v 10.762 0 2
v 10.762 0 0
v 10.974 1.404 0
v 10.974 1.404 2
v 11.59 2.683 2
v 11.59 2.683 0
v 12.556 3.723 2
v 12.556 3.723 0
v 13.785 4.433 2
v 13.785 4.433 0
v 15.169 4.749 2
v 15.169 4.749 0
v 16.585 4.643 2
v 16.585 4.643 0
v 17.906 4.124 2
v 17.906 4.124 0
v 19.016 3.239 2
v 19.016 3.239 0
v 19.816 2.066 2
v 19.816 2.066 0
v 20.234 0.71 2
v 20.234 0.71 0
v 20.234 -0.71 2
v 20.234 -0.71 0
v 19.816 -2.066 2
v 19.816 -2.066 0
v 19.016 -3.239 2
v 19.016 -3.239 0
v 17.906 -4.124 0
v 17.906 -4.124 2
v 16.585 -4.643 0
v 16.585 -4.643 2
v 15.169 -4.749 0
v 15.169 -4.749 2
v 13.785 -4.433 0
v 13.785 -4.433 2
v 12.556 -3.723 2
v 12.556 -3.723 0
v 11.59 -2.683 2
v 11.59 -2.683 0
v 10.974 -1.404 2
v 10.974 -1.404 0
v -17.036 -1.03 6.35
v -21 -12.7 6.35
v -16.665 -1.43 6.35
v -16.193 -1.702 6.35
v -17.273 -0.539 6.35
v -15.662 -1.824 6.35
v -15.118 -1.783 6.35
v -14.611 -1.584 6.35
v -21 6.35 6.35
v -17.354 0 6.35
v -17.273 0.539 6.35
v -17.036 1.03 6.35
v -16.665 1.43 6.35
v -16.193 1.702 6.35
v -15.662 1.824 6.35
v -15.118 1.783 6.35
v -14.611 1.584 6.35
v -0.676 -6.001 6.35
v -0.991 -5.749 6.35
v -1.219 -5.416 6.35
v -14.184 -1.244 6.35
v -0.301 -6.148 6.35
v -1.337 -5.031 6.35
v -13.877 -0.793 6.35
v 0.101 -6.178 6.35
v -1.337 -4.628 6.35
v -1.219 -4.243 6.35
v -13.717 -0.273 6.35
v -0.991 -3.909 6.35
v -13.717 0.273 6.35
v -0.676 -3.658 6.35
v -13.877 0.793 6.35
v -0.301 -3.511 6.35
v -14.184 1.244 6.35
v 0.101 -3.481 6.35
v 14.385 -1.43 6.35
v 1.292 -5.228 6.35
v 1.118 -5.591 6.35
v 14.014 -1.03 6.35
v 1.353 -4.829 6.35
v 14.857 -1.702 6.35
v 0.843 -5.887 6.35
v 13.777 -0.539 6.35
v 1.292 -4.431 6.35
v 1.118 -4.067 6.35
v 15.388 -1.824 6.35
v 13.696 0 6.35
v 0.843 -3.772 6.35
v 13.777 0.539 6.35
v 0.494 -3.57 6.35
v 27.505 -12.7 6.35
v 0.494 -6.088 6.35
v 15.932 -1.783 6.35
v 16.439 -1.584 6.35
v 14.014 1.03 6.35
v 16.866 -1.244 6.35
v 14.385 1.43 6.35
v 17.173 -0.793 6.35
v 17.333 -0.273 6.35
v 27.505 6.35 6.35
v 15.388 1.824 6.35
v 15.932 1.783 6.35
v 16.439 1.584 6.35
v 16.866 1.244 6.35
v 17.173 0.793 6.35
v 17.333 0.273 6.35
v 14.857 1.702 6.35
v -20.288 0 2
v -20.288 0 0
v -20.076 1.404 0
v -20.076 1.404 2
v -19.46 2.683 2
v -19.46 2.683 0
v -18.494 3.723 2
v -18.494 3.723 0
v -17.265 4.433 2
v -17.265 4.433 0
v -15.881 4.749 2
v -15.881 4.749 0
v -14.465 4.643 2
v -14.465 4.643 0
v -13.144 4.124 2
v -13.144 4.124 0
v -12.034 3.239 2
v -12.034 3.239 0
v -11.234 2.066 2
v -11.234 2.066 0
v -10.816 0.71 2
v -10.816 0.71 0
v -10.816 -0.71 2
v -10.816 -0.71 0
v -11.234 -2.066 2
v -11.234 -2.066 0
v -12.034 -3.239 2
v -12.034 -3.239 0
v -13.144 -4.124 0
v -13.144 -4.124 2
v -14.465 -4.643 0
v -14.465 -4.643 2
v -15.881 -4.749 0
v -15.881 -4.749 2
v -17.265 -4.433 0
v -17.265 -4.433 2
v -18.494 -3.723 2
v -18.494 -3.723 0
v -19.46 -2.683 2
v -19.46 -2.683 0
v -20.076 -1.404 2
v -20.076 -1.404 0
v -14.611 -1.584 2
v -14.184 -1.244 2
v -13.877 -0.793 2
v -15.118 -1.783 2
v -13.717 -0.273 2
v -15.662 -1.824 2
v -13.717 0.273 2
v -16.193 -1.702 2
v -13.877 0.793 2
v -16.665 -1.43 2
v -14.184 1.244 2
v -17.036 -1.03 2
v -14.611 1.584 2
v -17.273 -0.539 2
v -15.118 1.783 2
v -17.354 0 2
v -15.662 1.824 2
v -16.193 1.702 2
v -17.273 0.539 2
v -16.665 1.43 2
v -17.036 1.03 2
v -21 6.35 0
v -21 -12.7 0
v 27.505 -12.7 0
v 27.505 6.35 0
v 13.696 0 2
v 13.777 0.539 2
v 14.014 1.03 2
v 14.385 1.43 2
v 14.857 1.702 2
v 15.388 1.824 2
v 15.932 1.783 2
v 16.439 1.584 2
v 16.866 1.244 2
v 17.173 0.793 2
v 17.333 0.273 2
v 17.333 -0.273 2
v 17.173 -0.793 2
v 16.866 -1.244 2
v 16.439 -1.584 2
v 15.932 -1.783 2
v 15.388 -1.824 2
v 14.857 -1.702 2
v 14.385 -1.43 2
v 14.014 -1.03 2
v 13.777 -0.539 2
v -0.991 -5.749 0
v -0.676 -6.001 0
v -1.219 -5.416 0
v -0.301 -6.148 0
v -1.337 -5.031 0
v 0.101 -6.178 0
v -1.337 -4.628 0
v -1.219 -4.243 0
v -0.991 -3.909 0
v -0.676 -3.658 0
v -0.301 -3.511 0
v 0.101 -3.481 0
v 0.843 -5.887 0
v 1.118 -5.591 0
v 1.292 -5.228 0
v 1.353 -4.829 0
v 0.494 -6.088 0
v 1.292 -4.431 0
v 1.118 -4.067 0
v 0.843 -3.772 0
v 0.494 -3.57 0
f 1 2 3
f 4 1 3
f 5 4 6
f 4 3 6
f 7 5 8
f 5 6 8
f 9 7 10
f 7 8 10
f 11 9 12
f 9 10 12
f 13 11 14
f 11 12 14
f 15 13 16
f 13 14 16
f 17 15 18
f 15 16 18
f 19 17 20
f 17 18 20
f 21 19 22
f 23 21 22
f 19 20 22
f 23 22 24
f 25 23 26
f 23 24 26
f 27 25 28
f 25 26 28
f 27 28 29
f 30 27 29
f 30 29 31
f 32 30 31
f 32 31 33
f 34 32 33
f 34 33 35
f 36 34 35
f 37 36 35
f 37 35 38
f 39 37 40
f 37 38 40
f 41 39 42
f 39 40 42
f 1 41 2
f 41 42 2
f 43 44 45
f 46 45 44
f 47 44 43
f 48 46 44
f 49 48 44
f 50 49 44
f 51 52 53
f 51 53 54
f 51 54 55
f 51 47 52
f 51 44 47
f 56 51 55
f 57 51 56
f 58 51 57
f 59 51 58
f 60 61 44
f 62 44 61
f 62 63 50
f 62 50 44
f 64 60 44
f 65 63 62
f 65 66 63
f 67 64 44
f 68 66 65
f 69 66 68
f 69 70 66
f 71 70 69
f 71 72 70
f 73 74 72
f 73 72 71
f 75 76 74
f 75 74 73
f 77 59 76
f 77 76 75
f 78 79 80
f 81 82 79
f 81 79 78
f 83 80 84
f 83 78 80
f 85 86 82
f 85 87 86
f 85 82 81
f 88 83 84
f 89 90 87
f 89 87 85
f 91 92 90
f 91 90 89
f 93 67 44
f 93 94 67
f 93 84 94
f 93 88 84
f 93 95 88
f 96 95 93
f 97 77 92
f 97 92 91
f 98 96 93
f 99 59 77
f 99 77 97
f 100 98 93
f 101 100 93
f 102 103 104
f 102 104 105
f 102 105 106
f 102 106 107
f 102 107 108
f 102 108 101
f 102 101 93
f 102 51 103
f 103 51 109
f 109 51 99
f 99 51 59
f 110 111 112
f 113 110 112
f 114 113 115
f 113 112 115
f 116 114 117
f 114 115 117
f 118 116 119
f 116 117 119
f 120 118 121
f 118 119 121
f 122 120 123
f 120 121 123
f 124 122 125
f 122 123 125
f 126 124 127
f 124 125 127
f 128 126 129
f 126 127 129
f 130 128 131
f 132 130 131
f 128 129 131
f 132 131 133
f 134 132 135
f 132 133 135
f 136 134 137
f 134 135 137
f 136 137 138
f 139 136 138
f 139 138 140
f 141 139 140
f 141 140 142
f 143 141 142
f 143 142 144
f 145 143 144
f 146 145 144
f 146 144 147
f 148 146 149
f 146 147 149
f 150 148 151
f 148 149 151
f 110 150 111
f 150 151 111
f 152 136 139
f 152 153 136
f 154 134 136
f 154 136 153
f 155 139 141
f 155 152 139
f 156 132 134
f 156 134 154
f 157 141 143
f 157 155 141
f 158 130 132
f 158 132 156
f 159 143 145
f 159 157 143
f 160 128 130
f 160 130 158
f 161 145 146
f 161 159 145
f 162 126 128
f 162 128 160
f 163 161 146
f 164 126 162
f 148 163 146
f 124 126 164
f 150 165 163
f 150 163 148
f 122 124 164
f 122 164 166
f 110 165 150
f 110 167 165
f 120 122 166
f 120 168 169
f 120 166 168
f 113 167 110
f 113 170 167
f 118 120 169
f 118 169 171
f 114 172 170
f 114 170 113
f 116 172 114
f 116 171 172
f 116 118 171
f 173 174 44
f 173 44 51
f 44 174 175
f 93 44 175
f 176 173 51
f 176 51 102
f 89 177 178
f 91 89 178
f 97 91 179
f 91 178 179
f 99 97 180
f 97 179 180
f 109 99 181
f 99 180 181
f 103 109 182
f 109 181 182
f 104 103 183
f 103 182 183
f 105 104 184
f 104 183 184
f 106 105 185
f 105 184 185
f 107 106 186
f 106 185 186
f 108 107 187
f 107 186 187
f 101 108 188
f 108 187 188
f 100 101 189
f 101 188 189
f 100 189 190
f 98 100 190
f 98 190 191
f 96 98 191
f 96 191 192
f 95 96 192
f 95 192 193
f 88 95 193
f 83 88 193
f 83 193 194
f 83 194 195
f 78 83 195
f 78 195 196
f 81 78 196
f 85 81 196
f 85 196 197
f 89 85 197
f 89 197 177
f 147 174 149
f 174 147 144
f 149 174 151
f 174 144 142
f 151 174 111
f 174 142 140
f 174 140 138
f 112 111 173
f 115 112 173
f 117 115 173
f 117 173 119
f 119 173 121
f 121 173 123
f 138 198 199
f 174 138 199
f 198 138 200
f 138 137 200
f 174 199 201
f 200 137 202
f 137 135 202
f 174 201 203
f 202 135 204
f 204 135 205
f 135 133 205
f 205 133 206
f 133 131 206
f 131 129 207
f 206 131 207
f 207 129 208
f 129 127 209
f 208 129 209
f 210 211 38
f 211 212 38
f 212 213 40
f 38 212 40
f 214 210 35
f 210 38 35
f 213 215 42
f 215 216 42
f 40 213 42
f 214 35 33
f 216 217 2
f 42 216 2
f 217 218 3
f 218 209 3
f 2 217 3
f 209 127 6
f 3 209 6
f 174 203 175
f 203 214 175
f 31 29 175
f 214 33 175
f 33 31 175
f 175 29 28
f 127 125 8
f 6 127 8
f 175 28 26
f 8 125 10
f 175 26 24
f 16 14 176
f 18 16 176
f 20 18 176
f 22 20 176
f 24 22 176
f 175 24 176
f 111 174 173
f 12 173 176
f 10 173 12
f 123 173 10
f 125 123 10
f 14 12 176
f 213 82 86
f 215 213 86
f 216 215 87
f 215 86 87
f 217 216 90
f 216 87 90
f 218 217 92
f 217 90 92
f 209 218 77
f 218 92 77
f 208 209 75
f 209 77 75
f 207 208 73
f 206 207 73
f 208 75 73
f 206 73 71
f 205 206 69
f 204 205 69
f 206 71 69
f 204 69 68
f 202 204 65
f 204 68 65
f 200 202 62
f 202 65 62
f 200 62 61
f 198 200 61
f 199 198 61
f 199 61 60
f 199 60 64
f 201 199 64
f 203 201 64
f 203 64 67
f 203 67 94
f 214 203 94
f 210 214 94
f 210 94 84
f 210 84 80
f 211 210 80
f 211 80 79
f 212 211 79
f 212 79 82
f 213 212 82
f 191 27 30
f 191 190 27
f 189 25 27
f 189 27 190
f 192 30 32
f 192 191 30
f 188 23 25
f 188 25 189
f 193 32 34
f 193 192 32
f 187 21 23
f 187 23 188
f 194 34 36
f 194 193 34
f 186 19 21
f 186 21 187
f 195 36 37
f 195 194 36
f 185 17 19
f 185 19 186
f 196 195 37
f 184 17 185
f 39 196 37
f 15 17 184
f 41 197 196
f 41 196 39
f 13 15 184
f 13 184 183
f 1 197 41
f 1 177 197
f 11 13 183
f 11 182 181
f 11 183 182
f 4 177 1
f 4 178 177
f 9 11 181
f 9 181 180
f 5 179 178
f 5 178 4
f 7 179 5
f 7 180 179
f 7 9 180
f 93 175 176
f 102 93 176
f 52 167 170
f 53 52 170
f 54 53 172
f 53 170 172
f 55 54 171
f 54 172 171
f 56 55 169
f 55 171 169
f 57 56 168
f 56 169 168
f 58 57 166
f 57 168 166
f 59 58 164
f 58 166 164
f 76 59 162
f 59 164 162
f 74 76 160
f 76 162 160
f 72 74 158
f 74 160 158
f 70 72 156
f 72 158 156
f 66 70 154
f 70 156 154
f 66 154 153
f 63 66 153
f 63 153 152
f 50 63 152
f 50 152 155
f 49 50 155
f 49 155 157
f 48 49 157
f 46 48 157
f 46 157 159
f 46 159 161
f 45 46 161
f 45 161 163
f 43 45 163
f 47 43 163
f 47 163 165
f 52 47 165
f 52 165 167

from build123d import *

# Parameters (mm, degrees)
SKETCH1_W                 = 48.505
SKETCH1_H                 = 19.05
BOSS_EXTRUDE1_DEPTH       = 6.35
F_6_CLEARANCE_HOLE1_D     = 3.6576
F_6_CLEARANCE_HOLE1_DEPTH = 9.398
F_6_CLEARANCE_HOLE1_TIP   = 1.0988539
SKETCH4_R                 = 4.7625
CUT_EXTRUDE1_DEPTH        = 2
F_6_32_TAPPED_HOLE1_D     = 2.7051
F_6_32_TAPPED_HOLE1_DEPTH = 10.9728
F_6_32_TAPPED_HOLE1_TIP   = 0.81269403


with BuildPart() as part:
    # Sketch1 → Boss-Extrude1 (new body)
    with BuildSketch(Plane.XY):
        with Locations((3.2525, -3.175)):
            Rectangle(SKETCH1_W, SKETCH1_H)
    extrude(amount=BOSS_EXTRUDE1_DEPTH)

    # #6 Clearance Hole1
    with Locations(Plane.XY.offset(6.35)):
        with Locations((-15.525, 0), (15.525, 0)):
            Hole(F_6_CLEARANCE_HOLE1_D / 2, depth=F_6_CLEARANCE_HOLE1_DEPTH)
            with Locations((0, 0, -(F_6_CLEARANCE_HOLE1_DEPTH + F_6_CLEARANCE_HOLE1_TIP / 2))):  # 118° drill point
                Cone(0, F_6_CLEARANCE_HOLE1_D / 2, F_6_CLEARANCE_HOLE1_TIP, mode=Mode.SUBTRACT)

    # Sketch4 → Cut-Extrude1 (cut)
    with BuildSketch(Plane(origin=(0, 0, 0), x_dir=(-1, 0, 0), z_dir=(0, 0, -1))):
        with Locations((-15.525, 0)):
            Circle(SKETCH4_R)
        with Locations((15.525, 0)):
            Circle(SKETCH4_R)
    extrude(amount=-CUT_EXTRUDE1_DEPTH, mode=Mode.SUBTRACT)

    # #6-32 Tapped Hole1
    with Locations(Plane(origin=(0, 0, 0), x_dir=(-1, 0, 0), z_dir=(0, 0, -1))):
        with Locations((0, -4.8294)):
            Hole(F_6_32_TAPPED_HOLE1_D / 2, depth=F_6_32_TAPPED_HOLE1_DEPTH)
            with Locations((0, 0, -(F_6_32_TAPPED_HOLE1_DEPTH + F_6_32_TAPPED_HOLE1_TIP / 2))):  # 118° drill point
                Cone(0, F_6_32_TAPPED_HOLE1_D / 2, F_6_32_TAPPED_HOLE1_TIP, mode=Mode.SUBTRACT)


solid = part.part
